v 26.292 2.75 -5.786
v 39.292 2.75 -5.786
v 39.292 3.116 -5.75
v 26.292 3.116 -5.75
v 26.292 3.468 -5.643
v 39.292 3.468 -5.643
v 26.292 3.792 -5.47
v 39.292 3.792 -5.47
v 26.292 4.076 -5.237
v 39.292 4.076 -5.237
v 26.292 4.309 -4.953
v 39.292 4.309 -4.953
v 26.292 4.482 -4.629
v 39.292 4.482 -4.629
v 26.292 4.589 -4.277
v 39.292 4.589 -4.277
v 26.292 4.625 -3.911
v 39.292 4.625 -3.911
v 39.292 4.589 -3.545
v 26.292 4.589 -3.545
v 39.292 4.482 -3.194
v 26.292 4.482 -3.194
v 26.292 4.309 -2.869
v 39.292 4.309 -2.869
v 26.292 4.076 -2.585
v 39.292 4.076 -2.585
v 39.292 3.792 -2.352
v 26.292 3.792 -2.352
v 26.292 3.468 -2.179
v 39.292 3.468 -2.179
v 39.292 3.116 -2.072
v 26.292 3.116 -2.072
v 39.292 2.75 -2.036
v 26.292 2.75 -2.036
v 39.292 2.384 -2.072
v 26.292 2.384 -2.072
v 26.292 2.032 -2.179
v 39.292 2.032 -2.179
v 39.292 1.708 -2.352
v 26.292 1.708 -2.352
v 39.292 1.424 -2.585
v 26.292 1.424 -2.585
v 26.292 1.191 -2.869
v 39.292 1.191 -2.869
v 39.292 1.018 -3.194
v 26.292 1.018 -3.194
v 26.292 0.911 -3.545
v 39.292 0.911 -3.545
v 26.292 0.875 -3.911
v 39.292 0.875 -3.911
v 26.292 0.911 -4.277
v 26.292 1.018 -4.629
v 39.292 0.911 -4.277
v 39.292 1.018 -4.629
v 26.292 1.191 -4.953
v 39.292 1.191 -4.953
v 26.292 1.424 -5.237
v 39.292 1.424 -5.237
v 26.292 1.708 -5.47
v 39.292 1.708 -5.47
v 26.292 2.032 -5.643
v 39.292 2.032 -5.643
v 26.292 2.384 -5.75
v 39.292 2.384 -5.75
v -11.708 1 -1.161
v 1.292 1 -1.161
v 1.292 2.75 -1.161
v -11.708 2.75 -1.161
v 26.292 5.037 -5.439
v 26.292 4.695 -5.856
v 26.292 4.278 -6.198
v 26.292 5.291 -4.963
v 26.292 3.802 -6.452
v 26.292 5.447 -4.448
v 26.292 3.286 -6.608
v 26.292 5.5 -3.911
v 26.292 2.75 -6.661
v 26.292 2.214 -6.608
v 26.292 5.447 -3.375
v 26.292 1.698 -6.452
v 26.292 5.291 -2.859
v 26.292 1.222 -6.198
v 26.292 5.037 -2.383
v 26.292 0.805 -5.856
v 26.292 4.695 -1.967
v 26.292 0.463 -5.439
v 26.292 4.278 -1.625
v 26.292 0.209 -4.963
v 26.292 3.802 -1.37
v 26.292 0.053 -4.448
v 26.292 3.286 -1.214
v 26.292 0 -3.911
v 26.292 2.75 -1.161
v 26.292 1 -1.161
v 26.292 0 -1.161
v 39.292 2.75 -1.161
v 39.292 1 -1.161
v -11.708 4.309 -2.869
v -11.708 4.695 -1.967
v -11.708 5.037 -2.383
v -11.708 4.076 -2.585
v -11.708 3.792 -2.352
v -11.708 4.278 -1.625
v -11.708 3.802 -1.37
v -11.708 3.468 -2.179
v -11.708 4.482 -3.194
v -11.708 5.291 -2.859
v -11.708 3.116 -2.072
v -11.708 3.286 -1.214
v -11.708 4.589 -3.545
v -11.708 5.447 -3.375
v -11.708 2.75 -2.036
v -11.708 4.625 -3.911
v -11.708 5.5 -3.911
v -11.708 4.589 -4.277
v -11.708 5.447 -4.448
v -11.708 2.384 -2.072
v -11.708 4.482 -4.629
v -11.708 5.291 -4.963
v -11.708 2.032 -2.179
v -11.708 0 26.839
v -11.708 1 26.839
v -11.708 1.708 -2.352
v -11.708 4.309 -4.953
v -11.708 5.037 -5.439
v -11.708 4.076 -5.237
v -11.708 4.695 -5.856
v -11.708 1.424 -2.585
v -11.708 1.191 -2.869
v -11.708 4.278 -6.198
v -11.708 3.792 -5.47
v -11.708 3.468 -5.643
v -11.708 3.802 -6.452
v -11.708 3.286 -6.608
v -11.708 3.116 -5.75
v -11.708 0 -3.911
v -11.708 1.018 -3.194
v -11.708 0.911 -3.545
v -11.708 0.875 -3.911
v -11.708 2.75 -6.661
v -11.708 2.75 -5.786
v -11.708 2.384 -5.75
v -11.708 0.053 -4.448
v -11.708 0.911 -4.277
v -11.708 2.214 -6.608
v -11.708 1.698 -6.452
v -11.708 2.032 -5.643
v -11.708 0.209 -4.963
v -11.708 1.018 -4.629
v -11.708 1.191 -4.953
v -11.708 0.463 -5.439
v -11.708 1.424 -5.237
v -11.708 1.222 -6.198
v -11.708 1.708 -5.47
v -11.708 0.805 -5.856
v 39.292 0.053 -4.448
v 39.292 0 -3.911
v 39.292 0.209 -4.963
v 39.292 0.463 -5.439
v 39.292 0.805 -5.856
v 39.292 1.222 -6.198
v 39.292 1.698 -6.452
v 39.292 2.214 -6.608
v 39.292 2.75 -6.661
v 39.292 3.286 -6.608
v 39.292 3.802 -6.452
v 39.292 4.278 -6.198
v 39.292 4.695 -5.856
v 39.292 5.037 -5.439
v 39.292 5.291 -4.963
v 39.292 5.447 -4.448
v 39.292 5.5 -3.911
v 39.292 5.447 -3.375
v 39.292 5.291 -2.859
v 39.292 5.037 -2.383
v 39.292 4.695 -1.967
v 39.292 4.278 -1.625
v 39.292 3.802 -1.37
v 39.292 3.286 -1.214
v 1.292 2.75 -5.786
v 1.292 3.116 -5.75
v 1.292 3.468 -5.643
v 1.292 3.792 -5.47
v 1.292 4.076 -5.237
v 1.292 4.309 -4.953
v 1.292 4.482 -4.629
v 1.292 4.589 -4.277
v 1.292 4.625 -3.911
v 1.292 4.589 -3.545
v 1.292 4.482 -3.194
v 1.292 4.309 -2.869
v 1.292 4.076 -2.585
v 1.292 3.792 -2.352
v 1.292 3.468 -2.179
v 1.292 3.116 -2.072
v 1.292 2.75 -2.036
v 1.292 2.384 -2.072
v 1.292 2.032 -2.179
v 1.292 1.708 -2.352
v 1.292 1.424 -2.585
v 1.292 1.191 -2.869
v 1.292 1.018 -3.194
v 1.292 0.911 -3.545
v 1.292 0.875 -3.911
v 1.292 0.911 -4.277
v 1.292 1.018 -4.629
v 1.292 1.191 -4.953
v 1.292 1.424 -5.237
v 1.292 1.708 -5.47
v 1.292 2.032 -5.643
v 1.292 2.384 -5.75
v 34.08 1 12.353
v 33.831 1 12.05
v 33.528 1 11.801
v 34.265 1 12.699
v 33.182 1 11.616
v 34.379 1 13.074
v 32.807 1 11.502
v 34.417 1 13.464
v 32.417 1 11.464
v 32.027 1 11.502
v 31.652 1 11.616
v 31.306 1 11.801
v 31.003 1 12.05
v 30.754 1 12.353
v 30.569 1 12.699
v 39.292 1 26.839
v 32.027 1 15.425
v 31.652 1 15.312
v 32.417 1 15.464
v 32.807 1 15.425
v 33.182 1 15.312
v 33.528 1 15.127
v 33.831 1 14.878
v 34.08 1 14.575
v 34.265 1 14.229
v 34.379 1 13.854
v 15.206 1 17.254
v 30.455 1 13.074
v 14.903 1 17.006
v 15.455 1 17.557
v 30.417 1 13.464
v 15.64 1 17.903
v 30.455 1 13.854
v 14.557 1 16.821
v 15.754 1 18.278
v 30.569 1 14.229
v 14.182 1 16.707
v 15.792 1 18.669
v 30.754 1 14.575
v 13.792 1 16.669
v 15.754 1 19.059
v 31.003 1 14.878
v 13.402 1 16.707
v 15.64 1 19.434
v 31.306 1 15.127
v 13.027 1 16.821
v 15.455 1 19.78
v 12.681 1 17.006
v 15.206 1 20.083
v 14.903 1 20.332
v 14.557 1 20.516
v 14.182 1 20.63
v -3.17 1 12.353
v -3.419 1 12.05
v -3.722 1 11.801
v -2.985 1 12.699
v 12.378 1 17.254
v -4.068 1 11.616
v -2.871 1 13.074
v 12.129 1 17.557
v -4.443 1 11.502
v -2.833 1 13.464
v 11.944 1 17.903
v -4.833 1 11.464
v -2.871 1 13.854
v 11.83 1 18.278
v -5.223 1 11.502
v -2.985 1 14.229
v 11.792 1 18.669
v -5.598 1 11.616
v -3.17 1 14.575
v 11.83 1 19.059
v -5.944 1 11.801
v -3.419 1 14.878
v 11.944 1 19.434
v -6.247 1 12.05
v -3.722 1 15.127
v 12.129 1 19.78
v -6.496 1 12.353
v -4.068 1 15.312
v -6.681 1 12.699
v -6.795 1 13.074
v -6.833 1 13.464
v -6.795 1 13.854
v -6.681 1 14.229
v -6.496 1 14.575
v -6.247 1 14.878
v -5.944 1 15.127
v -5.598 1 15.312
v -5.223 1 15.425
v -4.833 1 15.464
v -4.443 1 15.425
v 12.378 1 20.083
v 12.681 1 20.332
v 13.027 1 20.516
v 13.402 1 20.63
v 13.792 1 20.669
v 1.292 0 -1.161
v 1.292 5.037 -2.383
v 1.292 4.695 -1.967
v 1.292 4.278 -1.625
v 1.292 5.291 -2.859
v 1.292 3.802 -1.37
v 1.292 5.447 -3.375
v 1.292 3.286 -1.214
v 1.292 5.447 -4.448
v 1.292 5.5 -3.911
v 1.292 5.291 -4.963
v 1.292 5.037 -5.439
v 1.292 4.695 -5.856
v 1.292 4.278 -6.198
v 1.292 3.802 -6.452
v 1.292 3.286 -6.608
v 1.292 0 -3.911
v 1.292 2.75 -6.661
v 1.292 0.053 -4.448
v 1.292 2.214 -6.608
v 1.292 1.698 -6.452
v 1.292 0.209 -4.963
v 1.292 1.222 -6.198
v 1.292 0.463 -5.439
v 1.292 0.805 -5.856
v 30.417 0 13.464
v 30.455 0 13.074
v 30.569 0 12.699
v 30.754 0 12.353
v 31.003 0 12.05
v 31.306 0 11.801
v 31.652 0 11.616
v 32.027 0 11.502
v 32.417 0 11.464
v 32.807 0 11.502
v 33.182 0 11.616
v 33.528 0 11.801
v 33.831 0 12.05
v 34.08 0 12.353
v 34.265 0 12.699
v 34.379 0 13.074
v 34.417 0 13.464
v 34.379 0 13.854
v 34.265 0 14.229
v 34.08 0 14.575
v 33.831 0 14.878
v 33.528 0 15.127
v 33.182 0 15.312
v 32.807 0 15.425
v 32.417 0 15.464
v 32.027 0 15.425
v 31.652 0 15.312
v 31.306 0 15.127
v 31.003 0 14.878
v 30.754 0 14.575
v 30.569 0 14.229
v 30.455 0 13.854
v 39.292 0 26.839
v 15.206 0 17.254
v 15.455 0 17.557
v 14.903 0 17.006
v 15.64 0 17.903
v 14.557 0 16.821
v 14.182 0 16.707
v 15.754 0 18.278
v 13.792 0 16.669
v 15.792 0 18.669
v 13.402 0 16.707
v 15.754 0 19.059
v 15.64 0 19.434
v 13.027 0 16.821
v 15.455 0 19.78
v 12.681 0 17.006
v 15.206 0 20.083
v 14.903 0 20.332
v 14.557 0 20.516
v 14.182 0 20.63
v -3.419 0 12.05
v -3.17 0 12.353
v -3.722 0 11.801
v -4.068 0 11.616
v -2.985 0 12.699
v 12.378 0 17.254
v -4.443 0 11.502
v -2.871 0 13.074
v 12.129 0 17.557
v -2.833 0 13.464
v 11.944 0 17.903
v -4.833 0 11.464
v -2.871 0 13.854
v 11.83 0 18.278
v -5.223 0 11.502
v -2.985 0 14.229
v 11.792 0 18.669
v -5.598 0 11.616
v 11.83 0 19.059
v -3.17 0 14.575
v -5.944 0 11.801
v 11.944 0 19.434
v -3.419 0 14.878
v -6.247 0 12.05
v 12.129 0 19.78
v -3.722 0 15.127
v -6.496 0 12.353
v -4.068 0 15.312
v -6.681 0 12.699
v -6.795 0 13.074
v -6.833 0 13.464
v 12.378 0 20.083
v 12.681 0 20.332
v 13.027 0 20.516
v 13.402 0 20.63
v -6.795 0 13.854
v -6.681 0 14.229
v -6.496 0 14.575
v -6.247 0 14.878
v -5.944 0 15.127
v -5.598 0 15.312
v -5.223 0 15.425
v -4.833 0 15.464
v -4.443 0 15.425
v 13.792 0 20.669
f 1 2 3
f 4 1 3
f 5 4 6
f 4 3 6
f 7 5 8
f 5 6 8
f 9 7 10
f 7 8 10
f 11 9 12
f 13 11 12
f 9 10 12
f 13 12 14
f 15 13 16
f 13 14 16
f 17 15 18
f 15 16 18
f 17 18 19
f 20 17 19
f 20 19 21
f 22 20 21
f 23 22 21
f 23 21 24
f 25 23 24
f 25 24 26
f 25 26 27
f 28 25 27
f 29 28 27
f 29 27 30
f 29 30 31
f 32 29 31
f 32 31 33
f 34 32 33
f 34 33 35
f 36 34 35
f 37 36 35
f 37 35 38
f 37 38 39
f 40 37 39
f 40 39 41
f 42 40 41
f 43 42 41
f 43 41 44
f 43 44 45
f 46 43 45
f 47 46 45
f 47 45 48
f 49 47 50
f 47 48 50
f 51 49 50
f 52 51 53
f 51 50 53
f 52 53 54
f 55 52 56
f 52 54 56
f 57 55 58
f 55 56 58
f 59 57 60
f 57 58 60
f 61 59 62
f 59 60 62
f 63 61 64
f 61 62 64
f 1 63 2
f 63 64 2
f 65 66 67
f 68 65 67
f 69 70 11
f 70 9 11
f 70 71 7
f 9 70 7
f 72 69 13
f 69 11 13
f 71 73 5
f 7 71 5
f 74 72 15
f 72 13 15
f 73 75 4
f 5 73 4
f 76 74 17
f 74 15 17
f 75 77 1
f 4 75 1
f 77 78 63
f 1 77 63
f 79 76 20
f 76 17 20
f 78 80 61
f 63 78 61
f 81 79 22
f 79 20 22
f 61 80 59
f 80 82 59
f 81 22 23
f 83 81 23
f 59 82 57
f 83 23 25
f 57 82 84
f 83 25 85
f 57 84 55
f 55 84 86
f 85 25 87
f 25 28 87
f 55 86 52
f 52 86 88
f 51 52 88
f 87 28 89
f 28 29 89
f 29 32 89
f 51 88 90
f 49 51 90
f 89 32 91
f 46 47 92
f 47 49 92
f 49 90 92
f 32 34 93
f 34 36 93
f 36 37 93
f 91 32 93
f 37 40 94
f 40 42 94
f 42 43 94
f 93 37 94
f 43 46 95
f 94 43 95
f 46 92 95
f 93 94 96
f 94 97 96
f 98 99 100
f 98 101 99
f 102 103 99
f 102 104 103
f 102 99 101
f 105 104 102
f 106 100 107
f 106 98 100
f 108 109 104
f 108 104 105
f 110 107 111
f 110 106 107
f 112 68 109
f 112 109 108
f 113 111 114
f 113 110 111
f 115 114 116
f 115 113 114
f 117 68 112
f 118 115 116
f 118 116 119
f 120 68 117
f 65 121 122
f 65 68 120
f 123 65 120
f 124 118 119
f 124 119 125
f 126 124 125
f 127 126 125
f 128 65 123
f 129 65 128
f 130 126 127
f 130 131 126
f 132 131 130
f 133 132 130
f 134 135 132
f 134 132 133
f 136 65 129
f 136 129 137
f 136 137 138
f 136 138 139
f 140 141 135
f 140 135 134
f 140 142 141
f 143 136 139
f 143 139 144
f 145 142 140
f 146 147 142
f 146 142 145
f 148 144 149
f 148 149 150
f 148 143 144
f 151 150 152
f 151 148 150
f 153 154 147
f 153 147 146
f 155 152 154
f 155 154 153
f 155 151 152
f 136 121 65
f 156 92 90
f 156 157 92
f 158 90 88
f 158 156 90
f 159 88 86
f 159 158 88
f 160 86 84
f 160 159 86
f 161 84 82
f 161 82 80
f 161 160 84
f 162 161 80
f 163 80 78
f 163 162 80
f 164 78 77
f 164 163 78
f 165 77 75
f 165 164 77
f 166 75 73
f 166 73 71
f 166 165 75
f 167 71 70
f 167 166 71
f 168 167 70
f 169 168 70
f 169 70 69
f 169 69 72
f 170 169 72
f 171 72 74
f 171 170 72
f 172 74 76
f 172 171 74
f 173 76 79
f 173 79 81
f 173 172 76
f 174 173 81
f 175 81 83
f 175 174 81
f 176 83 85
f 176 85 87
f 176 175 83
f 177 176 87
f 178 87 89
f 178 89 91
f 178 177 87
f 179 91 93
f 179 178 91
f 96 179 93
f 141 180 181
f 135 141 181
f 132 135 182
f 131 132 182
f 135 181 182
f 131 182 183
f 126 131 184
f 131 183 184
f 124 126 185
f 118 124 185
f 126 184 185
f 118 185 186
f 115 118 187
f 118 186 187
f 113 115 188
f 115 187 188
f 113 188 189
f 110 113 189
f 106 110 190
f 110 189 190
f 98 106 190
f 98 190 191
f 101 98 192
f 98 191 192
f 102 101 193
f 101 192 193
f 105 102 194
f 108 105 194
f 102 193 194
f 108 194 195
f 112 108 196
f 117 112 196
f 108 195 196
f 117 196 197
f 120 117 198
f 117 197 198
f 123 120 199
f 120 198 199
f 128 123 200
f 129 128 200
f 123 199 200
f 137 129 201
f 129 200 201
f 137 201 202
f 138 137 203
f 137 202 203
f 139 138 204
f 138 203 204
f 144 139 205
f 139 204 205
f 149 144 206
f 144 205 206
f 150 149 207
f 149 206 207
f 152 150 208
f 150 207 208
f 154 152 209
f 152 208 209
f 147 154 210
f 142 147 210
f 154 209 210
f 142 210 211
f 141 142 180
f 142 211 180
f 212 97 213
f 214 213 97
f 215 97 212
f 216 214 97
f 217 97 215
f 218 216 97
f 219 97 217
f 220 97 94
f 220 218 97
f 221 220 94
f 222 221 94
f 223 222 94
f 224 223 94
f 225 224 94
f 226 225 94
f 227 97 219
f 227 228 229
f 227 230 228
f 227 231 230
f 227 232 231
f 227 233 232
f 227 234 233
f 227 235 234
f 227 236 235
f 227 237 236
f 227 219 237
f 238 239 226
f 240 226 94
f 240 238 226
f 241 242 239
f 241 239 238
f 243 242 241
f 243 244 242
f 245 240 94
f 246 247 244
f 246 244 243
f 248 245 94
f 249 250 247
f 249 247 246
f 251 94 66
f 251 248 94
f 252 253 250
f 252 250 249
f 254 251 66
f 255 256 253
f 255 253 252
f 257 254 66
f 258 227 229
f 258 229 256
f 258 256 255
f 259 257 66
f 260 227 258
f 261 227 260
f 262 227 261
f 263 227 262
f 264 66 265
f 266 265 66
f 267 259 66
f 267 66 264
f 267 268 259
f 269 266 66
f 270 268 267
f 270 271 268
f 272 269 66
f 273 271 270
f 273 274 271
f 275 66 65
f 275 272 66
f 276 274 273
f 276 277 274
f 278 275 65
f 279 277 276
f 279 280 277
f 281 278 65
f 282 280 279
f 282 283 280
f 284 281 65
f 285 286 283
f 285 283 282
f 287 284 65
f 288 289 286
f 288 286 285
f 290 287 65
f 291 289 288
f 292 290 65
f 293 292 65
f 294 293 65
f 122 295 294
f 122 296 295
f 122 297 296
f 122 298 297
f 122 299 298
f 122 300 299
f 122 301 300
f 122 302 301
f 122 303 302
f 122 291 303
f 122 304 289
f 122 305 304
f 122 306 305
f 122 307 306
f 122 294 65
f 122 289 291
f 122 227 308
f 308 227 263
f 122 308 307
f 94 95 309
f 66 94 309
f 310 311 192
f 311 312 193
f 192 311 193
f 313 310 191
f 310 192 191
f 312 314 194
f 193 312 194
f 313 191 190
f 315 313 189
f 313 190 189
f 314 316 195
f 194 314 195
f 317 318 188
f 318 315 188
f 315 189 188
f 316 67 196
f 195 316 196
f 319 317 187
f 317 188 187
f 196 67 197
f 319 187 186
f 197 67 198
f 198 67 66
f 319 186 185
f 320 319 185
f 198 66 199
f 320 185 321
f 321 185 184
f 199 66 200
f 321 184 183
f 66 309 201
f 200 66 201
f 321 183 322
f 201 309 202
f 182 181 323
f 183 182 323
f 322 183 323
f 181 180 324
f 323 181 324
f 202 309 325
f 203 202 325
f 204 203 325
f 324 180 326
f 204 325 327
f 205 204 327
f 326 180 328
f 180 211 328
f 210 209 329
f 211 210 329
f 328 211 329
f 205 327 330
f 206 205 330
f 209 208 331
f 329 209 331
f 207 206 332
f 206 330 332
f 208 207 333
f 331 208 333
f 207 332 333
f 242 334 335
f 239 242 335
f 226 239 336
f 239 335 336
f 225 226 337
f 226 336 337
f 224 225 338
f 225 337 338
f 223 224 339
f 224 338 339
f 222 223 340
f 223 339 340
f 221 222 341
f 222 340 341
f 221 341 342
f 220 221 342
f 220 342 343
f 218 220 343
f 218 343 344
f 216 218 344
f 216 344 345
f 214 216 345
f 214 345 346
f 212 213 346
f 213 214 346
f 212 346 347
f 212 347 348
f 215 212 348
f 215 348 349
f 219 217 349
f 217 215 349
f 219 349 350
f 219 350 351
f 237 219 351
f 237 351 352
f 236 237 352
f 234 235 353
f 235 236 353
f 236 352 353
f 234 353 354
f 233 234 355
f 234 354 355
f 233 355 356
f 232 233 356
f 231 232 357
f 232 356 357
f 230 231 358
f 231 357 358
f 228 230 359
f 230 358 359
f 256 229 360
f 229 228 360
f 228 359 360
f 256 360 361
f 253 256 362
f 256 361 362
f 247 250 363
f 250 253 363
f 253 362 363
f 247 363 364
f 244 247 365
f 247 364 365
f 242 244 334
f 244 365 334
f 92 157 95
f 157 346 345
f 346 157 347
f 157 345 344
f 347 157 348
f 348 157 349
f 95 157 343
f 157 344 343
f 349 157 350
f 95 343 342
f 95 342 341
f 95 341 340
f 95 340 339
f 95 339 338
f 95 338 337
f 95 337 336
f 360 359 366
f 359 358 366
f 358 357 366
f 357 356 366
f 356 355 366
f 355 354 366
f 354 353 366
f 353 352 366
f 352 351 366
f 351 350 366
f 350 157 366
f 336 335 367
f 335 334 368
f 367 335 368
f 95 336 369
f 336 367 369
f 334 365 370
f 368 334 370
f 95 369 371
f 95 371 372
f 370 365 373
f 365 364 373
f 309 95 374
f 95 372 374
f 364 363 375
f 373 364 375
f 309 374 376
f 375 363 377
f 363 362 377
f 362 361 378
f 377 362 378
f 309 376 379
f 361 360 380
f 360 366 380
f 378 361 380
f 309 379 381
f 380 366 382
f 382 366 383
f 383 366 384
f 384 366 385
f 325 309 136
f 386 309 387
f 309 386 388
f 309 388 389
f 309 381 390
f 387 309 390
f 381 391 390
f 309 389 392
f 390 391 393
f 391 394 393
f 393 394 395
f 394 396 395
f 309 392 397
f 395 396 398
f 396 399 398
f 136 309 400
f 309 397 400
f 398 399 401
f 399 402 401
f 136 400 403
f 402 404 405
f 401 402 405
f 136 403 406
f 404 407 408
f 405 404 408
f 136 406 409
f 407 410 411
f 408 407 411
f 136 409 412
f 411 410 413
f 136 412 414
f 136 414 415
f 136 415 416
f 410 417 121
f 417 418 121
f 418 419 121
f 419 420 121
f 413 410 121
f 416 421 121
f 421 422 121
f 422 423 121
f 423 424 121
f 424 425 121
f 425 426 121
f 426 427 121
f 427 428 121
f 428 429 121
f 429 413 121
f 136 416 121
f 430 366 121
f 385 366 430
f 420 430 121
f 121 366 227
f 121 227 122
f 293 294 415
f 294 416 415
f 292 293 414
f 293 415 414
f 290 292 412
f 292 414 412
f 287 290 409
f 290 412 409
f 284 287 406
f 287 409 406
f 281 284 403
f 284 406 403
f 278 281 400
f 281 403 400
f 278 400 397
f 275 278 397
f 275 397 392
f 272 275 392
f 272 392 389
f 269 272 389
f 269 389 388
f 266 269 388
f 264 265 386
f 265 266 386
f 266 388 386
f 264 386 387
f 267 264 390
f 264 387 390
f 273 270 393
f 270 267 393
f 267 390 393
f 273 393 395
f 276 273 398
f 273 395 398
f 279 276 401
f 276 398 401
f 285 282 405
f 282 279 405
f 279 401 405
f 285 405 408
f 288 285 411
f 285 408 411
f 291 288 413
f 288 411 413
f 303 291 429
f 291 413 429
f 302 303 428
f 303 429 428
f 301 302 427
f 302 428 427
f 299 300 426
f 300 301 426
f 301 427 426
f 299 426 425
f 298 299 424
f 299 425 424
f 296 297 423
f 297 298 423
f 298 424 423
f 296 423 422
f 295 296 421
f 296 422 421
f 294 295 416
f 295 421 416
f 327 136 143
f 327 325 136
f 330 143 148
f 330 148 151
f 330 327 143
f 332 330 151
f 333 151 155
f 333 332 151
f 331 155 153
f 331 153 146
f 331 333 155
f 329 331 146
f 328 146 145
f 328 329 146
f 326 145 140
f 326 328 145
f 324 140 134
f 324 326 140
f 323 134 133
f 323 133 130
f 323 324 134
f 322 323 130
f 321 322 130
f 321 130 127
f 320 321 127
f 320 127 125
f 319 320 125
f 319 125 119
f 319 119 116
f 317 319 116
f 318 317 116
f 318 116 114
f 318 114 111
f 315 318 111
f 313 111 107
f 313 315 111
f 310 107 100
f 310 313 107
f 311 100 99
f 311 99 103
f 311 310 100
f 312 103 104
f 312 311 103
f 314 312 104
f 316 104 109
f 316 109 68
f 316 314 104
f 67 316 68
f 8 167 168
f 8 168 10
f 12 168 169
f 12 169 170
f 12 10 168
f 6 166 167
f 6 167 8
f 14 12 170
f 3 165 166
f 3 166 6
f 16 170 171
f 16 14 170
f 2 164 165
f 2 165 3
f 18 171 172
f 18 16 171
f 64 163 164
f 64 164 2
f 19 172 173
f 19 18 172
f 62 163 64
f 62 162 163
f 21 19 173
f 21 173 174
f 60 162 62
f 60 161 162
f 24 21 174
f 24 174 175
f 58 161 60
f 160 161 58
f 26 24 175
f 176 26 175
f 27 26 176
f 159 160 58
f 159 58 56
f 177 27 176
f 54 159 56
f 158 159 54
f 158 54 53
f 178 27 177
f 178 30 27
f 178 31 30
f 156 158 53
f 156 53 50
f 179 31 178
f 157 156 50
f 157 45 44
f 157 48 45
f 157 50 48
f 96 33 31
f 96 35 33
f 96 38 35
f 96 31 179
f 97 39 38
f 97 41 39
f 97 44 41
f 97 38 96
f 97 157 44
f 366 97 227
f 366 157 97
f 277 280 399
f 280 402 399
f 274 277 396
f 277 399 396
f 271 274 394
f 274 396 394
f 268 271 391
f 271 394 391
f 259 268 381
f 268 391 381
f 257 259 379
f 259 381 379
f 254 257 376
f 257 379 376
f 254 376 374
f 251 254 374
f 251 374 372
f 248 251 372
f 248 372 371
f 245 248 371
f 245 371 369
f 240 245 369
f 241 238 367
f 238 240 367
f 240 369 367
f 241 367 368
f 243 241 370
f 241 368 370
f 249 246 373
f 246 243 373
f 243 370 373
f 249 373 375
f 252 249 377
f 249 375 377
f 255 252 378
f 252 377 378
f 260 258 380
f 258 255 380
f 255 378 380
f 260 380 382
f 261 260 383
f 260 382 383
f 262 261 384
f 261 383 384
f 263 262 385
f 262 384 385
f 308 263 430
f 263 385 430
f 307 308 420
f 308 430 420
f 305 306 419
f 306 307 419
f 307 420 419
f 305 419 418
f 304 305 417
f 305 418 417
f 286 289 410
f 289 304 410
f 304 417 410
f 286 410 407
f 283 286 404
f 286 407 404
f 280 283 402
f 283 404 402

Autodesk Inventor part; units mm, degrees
ref_plane "YZ Plane" through (0, 0, 0) normal (1, 0, 0) x (0, 1, 0)
ref_plane "XZ Plane" through (0, 0, 0) normal (0, 1, 0) x (-1, 0, 0)
ref_plane "XY Plane" through (0, 0, 0) normal (0, 0, 1) x (1, 0, 0)
sketch "Boceto1" plane through (0, 0, 0) normal (0, 1, 0) x (-1, 0, 0)
  line L0 (11.708, 26.8389) -> (11.708, -1.1611)
  line L1 (11.708, -1.1611) -> (-39.292, -1.1611)
  line L2 (-39.292, -1.1611) -> (-39.292, 26.8389)
  line L3 (-39.292, 26.8389) -> (11.708, 26.8389)
  circle A0 centre (4.833, 13.4639) radius 2
  circle A1 centre (-32.417, 13.4639) radius 2
  circle A2 centre (-13.792, 18.6686) radius 2
  point P0 (0, 0)
  dimension "d0" = 28
  dimension "d1" = 51
  dimension "d2" = 4
  dimension "d3" = 4
  dimension "d4" = 4
  dimension "d5" = 25.5
  dimension "d6" = 6.875
  dimension "d7" = 13.375
  dimension "d8" = 6.875
  dimension "d9" = 13.375
extrude "Extrusión1" add sketch "Boceto1" along normal blind 1
sketch "Boceto2" plane through (39.292, 0, 26.8389) normal (1, 0, 0) x (0, 0, -1)
  arc A0 (30.75, 0) -> (28, 2.75) centre (30.75, 2.75) ccw
  circle A1 centre (30.75, 2.75) radius 1.875
  line L0 (0, 0) -> (28, 0) projected
  line L1 (28, 0) -> (28, 1) projected
  line L2 (28, 0) -> (28, 2.75)
  line L3 (28, 0) -> (30.75, 0)
  point P0 (26.8389, 0)
  dimension "d12" = 5.5
  dimension "d13" = 3.75
extrude "Extrusión2" add sketch "Boceto2" against normal blind 51
sketch "Boceto3" plane through (0, 0, 0) normal (0, -1, 0) x (1, 0, 0)
  line L0 (39.292, -1.1611) -> (-11.708, -1.1611) projected
  line L1 (39.292, -1.1611) -> (-11.708, -1.1611)
  line L2 (-11.708, -2.0361) -> (39.292, -2.0361) projected
  line L3 (13.792, -1.1611) -> (26.292, -1.1611)
  line L4 (26.292, -1.1611) -> (1.292, -1.1611)
  line L5 (1.292, -1.1611) -> (1.292, -7.7765)
  line L6 (1.292, -7.7765) -> (26.292, -7.7765)
  line L7 (26.292, -7.7765) -> (26.292, -1.1611)
  dimension "d16" = 12.5
  dimension "d17" = 25
extrude "Extrusión3" cut sketch "Boceto3" against normal blind 51
properties part number "Ala 1 Bisagra tipo Libro Grande"
